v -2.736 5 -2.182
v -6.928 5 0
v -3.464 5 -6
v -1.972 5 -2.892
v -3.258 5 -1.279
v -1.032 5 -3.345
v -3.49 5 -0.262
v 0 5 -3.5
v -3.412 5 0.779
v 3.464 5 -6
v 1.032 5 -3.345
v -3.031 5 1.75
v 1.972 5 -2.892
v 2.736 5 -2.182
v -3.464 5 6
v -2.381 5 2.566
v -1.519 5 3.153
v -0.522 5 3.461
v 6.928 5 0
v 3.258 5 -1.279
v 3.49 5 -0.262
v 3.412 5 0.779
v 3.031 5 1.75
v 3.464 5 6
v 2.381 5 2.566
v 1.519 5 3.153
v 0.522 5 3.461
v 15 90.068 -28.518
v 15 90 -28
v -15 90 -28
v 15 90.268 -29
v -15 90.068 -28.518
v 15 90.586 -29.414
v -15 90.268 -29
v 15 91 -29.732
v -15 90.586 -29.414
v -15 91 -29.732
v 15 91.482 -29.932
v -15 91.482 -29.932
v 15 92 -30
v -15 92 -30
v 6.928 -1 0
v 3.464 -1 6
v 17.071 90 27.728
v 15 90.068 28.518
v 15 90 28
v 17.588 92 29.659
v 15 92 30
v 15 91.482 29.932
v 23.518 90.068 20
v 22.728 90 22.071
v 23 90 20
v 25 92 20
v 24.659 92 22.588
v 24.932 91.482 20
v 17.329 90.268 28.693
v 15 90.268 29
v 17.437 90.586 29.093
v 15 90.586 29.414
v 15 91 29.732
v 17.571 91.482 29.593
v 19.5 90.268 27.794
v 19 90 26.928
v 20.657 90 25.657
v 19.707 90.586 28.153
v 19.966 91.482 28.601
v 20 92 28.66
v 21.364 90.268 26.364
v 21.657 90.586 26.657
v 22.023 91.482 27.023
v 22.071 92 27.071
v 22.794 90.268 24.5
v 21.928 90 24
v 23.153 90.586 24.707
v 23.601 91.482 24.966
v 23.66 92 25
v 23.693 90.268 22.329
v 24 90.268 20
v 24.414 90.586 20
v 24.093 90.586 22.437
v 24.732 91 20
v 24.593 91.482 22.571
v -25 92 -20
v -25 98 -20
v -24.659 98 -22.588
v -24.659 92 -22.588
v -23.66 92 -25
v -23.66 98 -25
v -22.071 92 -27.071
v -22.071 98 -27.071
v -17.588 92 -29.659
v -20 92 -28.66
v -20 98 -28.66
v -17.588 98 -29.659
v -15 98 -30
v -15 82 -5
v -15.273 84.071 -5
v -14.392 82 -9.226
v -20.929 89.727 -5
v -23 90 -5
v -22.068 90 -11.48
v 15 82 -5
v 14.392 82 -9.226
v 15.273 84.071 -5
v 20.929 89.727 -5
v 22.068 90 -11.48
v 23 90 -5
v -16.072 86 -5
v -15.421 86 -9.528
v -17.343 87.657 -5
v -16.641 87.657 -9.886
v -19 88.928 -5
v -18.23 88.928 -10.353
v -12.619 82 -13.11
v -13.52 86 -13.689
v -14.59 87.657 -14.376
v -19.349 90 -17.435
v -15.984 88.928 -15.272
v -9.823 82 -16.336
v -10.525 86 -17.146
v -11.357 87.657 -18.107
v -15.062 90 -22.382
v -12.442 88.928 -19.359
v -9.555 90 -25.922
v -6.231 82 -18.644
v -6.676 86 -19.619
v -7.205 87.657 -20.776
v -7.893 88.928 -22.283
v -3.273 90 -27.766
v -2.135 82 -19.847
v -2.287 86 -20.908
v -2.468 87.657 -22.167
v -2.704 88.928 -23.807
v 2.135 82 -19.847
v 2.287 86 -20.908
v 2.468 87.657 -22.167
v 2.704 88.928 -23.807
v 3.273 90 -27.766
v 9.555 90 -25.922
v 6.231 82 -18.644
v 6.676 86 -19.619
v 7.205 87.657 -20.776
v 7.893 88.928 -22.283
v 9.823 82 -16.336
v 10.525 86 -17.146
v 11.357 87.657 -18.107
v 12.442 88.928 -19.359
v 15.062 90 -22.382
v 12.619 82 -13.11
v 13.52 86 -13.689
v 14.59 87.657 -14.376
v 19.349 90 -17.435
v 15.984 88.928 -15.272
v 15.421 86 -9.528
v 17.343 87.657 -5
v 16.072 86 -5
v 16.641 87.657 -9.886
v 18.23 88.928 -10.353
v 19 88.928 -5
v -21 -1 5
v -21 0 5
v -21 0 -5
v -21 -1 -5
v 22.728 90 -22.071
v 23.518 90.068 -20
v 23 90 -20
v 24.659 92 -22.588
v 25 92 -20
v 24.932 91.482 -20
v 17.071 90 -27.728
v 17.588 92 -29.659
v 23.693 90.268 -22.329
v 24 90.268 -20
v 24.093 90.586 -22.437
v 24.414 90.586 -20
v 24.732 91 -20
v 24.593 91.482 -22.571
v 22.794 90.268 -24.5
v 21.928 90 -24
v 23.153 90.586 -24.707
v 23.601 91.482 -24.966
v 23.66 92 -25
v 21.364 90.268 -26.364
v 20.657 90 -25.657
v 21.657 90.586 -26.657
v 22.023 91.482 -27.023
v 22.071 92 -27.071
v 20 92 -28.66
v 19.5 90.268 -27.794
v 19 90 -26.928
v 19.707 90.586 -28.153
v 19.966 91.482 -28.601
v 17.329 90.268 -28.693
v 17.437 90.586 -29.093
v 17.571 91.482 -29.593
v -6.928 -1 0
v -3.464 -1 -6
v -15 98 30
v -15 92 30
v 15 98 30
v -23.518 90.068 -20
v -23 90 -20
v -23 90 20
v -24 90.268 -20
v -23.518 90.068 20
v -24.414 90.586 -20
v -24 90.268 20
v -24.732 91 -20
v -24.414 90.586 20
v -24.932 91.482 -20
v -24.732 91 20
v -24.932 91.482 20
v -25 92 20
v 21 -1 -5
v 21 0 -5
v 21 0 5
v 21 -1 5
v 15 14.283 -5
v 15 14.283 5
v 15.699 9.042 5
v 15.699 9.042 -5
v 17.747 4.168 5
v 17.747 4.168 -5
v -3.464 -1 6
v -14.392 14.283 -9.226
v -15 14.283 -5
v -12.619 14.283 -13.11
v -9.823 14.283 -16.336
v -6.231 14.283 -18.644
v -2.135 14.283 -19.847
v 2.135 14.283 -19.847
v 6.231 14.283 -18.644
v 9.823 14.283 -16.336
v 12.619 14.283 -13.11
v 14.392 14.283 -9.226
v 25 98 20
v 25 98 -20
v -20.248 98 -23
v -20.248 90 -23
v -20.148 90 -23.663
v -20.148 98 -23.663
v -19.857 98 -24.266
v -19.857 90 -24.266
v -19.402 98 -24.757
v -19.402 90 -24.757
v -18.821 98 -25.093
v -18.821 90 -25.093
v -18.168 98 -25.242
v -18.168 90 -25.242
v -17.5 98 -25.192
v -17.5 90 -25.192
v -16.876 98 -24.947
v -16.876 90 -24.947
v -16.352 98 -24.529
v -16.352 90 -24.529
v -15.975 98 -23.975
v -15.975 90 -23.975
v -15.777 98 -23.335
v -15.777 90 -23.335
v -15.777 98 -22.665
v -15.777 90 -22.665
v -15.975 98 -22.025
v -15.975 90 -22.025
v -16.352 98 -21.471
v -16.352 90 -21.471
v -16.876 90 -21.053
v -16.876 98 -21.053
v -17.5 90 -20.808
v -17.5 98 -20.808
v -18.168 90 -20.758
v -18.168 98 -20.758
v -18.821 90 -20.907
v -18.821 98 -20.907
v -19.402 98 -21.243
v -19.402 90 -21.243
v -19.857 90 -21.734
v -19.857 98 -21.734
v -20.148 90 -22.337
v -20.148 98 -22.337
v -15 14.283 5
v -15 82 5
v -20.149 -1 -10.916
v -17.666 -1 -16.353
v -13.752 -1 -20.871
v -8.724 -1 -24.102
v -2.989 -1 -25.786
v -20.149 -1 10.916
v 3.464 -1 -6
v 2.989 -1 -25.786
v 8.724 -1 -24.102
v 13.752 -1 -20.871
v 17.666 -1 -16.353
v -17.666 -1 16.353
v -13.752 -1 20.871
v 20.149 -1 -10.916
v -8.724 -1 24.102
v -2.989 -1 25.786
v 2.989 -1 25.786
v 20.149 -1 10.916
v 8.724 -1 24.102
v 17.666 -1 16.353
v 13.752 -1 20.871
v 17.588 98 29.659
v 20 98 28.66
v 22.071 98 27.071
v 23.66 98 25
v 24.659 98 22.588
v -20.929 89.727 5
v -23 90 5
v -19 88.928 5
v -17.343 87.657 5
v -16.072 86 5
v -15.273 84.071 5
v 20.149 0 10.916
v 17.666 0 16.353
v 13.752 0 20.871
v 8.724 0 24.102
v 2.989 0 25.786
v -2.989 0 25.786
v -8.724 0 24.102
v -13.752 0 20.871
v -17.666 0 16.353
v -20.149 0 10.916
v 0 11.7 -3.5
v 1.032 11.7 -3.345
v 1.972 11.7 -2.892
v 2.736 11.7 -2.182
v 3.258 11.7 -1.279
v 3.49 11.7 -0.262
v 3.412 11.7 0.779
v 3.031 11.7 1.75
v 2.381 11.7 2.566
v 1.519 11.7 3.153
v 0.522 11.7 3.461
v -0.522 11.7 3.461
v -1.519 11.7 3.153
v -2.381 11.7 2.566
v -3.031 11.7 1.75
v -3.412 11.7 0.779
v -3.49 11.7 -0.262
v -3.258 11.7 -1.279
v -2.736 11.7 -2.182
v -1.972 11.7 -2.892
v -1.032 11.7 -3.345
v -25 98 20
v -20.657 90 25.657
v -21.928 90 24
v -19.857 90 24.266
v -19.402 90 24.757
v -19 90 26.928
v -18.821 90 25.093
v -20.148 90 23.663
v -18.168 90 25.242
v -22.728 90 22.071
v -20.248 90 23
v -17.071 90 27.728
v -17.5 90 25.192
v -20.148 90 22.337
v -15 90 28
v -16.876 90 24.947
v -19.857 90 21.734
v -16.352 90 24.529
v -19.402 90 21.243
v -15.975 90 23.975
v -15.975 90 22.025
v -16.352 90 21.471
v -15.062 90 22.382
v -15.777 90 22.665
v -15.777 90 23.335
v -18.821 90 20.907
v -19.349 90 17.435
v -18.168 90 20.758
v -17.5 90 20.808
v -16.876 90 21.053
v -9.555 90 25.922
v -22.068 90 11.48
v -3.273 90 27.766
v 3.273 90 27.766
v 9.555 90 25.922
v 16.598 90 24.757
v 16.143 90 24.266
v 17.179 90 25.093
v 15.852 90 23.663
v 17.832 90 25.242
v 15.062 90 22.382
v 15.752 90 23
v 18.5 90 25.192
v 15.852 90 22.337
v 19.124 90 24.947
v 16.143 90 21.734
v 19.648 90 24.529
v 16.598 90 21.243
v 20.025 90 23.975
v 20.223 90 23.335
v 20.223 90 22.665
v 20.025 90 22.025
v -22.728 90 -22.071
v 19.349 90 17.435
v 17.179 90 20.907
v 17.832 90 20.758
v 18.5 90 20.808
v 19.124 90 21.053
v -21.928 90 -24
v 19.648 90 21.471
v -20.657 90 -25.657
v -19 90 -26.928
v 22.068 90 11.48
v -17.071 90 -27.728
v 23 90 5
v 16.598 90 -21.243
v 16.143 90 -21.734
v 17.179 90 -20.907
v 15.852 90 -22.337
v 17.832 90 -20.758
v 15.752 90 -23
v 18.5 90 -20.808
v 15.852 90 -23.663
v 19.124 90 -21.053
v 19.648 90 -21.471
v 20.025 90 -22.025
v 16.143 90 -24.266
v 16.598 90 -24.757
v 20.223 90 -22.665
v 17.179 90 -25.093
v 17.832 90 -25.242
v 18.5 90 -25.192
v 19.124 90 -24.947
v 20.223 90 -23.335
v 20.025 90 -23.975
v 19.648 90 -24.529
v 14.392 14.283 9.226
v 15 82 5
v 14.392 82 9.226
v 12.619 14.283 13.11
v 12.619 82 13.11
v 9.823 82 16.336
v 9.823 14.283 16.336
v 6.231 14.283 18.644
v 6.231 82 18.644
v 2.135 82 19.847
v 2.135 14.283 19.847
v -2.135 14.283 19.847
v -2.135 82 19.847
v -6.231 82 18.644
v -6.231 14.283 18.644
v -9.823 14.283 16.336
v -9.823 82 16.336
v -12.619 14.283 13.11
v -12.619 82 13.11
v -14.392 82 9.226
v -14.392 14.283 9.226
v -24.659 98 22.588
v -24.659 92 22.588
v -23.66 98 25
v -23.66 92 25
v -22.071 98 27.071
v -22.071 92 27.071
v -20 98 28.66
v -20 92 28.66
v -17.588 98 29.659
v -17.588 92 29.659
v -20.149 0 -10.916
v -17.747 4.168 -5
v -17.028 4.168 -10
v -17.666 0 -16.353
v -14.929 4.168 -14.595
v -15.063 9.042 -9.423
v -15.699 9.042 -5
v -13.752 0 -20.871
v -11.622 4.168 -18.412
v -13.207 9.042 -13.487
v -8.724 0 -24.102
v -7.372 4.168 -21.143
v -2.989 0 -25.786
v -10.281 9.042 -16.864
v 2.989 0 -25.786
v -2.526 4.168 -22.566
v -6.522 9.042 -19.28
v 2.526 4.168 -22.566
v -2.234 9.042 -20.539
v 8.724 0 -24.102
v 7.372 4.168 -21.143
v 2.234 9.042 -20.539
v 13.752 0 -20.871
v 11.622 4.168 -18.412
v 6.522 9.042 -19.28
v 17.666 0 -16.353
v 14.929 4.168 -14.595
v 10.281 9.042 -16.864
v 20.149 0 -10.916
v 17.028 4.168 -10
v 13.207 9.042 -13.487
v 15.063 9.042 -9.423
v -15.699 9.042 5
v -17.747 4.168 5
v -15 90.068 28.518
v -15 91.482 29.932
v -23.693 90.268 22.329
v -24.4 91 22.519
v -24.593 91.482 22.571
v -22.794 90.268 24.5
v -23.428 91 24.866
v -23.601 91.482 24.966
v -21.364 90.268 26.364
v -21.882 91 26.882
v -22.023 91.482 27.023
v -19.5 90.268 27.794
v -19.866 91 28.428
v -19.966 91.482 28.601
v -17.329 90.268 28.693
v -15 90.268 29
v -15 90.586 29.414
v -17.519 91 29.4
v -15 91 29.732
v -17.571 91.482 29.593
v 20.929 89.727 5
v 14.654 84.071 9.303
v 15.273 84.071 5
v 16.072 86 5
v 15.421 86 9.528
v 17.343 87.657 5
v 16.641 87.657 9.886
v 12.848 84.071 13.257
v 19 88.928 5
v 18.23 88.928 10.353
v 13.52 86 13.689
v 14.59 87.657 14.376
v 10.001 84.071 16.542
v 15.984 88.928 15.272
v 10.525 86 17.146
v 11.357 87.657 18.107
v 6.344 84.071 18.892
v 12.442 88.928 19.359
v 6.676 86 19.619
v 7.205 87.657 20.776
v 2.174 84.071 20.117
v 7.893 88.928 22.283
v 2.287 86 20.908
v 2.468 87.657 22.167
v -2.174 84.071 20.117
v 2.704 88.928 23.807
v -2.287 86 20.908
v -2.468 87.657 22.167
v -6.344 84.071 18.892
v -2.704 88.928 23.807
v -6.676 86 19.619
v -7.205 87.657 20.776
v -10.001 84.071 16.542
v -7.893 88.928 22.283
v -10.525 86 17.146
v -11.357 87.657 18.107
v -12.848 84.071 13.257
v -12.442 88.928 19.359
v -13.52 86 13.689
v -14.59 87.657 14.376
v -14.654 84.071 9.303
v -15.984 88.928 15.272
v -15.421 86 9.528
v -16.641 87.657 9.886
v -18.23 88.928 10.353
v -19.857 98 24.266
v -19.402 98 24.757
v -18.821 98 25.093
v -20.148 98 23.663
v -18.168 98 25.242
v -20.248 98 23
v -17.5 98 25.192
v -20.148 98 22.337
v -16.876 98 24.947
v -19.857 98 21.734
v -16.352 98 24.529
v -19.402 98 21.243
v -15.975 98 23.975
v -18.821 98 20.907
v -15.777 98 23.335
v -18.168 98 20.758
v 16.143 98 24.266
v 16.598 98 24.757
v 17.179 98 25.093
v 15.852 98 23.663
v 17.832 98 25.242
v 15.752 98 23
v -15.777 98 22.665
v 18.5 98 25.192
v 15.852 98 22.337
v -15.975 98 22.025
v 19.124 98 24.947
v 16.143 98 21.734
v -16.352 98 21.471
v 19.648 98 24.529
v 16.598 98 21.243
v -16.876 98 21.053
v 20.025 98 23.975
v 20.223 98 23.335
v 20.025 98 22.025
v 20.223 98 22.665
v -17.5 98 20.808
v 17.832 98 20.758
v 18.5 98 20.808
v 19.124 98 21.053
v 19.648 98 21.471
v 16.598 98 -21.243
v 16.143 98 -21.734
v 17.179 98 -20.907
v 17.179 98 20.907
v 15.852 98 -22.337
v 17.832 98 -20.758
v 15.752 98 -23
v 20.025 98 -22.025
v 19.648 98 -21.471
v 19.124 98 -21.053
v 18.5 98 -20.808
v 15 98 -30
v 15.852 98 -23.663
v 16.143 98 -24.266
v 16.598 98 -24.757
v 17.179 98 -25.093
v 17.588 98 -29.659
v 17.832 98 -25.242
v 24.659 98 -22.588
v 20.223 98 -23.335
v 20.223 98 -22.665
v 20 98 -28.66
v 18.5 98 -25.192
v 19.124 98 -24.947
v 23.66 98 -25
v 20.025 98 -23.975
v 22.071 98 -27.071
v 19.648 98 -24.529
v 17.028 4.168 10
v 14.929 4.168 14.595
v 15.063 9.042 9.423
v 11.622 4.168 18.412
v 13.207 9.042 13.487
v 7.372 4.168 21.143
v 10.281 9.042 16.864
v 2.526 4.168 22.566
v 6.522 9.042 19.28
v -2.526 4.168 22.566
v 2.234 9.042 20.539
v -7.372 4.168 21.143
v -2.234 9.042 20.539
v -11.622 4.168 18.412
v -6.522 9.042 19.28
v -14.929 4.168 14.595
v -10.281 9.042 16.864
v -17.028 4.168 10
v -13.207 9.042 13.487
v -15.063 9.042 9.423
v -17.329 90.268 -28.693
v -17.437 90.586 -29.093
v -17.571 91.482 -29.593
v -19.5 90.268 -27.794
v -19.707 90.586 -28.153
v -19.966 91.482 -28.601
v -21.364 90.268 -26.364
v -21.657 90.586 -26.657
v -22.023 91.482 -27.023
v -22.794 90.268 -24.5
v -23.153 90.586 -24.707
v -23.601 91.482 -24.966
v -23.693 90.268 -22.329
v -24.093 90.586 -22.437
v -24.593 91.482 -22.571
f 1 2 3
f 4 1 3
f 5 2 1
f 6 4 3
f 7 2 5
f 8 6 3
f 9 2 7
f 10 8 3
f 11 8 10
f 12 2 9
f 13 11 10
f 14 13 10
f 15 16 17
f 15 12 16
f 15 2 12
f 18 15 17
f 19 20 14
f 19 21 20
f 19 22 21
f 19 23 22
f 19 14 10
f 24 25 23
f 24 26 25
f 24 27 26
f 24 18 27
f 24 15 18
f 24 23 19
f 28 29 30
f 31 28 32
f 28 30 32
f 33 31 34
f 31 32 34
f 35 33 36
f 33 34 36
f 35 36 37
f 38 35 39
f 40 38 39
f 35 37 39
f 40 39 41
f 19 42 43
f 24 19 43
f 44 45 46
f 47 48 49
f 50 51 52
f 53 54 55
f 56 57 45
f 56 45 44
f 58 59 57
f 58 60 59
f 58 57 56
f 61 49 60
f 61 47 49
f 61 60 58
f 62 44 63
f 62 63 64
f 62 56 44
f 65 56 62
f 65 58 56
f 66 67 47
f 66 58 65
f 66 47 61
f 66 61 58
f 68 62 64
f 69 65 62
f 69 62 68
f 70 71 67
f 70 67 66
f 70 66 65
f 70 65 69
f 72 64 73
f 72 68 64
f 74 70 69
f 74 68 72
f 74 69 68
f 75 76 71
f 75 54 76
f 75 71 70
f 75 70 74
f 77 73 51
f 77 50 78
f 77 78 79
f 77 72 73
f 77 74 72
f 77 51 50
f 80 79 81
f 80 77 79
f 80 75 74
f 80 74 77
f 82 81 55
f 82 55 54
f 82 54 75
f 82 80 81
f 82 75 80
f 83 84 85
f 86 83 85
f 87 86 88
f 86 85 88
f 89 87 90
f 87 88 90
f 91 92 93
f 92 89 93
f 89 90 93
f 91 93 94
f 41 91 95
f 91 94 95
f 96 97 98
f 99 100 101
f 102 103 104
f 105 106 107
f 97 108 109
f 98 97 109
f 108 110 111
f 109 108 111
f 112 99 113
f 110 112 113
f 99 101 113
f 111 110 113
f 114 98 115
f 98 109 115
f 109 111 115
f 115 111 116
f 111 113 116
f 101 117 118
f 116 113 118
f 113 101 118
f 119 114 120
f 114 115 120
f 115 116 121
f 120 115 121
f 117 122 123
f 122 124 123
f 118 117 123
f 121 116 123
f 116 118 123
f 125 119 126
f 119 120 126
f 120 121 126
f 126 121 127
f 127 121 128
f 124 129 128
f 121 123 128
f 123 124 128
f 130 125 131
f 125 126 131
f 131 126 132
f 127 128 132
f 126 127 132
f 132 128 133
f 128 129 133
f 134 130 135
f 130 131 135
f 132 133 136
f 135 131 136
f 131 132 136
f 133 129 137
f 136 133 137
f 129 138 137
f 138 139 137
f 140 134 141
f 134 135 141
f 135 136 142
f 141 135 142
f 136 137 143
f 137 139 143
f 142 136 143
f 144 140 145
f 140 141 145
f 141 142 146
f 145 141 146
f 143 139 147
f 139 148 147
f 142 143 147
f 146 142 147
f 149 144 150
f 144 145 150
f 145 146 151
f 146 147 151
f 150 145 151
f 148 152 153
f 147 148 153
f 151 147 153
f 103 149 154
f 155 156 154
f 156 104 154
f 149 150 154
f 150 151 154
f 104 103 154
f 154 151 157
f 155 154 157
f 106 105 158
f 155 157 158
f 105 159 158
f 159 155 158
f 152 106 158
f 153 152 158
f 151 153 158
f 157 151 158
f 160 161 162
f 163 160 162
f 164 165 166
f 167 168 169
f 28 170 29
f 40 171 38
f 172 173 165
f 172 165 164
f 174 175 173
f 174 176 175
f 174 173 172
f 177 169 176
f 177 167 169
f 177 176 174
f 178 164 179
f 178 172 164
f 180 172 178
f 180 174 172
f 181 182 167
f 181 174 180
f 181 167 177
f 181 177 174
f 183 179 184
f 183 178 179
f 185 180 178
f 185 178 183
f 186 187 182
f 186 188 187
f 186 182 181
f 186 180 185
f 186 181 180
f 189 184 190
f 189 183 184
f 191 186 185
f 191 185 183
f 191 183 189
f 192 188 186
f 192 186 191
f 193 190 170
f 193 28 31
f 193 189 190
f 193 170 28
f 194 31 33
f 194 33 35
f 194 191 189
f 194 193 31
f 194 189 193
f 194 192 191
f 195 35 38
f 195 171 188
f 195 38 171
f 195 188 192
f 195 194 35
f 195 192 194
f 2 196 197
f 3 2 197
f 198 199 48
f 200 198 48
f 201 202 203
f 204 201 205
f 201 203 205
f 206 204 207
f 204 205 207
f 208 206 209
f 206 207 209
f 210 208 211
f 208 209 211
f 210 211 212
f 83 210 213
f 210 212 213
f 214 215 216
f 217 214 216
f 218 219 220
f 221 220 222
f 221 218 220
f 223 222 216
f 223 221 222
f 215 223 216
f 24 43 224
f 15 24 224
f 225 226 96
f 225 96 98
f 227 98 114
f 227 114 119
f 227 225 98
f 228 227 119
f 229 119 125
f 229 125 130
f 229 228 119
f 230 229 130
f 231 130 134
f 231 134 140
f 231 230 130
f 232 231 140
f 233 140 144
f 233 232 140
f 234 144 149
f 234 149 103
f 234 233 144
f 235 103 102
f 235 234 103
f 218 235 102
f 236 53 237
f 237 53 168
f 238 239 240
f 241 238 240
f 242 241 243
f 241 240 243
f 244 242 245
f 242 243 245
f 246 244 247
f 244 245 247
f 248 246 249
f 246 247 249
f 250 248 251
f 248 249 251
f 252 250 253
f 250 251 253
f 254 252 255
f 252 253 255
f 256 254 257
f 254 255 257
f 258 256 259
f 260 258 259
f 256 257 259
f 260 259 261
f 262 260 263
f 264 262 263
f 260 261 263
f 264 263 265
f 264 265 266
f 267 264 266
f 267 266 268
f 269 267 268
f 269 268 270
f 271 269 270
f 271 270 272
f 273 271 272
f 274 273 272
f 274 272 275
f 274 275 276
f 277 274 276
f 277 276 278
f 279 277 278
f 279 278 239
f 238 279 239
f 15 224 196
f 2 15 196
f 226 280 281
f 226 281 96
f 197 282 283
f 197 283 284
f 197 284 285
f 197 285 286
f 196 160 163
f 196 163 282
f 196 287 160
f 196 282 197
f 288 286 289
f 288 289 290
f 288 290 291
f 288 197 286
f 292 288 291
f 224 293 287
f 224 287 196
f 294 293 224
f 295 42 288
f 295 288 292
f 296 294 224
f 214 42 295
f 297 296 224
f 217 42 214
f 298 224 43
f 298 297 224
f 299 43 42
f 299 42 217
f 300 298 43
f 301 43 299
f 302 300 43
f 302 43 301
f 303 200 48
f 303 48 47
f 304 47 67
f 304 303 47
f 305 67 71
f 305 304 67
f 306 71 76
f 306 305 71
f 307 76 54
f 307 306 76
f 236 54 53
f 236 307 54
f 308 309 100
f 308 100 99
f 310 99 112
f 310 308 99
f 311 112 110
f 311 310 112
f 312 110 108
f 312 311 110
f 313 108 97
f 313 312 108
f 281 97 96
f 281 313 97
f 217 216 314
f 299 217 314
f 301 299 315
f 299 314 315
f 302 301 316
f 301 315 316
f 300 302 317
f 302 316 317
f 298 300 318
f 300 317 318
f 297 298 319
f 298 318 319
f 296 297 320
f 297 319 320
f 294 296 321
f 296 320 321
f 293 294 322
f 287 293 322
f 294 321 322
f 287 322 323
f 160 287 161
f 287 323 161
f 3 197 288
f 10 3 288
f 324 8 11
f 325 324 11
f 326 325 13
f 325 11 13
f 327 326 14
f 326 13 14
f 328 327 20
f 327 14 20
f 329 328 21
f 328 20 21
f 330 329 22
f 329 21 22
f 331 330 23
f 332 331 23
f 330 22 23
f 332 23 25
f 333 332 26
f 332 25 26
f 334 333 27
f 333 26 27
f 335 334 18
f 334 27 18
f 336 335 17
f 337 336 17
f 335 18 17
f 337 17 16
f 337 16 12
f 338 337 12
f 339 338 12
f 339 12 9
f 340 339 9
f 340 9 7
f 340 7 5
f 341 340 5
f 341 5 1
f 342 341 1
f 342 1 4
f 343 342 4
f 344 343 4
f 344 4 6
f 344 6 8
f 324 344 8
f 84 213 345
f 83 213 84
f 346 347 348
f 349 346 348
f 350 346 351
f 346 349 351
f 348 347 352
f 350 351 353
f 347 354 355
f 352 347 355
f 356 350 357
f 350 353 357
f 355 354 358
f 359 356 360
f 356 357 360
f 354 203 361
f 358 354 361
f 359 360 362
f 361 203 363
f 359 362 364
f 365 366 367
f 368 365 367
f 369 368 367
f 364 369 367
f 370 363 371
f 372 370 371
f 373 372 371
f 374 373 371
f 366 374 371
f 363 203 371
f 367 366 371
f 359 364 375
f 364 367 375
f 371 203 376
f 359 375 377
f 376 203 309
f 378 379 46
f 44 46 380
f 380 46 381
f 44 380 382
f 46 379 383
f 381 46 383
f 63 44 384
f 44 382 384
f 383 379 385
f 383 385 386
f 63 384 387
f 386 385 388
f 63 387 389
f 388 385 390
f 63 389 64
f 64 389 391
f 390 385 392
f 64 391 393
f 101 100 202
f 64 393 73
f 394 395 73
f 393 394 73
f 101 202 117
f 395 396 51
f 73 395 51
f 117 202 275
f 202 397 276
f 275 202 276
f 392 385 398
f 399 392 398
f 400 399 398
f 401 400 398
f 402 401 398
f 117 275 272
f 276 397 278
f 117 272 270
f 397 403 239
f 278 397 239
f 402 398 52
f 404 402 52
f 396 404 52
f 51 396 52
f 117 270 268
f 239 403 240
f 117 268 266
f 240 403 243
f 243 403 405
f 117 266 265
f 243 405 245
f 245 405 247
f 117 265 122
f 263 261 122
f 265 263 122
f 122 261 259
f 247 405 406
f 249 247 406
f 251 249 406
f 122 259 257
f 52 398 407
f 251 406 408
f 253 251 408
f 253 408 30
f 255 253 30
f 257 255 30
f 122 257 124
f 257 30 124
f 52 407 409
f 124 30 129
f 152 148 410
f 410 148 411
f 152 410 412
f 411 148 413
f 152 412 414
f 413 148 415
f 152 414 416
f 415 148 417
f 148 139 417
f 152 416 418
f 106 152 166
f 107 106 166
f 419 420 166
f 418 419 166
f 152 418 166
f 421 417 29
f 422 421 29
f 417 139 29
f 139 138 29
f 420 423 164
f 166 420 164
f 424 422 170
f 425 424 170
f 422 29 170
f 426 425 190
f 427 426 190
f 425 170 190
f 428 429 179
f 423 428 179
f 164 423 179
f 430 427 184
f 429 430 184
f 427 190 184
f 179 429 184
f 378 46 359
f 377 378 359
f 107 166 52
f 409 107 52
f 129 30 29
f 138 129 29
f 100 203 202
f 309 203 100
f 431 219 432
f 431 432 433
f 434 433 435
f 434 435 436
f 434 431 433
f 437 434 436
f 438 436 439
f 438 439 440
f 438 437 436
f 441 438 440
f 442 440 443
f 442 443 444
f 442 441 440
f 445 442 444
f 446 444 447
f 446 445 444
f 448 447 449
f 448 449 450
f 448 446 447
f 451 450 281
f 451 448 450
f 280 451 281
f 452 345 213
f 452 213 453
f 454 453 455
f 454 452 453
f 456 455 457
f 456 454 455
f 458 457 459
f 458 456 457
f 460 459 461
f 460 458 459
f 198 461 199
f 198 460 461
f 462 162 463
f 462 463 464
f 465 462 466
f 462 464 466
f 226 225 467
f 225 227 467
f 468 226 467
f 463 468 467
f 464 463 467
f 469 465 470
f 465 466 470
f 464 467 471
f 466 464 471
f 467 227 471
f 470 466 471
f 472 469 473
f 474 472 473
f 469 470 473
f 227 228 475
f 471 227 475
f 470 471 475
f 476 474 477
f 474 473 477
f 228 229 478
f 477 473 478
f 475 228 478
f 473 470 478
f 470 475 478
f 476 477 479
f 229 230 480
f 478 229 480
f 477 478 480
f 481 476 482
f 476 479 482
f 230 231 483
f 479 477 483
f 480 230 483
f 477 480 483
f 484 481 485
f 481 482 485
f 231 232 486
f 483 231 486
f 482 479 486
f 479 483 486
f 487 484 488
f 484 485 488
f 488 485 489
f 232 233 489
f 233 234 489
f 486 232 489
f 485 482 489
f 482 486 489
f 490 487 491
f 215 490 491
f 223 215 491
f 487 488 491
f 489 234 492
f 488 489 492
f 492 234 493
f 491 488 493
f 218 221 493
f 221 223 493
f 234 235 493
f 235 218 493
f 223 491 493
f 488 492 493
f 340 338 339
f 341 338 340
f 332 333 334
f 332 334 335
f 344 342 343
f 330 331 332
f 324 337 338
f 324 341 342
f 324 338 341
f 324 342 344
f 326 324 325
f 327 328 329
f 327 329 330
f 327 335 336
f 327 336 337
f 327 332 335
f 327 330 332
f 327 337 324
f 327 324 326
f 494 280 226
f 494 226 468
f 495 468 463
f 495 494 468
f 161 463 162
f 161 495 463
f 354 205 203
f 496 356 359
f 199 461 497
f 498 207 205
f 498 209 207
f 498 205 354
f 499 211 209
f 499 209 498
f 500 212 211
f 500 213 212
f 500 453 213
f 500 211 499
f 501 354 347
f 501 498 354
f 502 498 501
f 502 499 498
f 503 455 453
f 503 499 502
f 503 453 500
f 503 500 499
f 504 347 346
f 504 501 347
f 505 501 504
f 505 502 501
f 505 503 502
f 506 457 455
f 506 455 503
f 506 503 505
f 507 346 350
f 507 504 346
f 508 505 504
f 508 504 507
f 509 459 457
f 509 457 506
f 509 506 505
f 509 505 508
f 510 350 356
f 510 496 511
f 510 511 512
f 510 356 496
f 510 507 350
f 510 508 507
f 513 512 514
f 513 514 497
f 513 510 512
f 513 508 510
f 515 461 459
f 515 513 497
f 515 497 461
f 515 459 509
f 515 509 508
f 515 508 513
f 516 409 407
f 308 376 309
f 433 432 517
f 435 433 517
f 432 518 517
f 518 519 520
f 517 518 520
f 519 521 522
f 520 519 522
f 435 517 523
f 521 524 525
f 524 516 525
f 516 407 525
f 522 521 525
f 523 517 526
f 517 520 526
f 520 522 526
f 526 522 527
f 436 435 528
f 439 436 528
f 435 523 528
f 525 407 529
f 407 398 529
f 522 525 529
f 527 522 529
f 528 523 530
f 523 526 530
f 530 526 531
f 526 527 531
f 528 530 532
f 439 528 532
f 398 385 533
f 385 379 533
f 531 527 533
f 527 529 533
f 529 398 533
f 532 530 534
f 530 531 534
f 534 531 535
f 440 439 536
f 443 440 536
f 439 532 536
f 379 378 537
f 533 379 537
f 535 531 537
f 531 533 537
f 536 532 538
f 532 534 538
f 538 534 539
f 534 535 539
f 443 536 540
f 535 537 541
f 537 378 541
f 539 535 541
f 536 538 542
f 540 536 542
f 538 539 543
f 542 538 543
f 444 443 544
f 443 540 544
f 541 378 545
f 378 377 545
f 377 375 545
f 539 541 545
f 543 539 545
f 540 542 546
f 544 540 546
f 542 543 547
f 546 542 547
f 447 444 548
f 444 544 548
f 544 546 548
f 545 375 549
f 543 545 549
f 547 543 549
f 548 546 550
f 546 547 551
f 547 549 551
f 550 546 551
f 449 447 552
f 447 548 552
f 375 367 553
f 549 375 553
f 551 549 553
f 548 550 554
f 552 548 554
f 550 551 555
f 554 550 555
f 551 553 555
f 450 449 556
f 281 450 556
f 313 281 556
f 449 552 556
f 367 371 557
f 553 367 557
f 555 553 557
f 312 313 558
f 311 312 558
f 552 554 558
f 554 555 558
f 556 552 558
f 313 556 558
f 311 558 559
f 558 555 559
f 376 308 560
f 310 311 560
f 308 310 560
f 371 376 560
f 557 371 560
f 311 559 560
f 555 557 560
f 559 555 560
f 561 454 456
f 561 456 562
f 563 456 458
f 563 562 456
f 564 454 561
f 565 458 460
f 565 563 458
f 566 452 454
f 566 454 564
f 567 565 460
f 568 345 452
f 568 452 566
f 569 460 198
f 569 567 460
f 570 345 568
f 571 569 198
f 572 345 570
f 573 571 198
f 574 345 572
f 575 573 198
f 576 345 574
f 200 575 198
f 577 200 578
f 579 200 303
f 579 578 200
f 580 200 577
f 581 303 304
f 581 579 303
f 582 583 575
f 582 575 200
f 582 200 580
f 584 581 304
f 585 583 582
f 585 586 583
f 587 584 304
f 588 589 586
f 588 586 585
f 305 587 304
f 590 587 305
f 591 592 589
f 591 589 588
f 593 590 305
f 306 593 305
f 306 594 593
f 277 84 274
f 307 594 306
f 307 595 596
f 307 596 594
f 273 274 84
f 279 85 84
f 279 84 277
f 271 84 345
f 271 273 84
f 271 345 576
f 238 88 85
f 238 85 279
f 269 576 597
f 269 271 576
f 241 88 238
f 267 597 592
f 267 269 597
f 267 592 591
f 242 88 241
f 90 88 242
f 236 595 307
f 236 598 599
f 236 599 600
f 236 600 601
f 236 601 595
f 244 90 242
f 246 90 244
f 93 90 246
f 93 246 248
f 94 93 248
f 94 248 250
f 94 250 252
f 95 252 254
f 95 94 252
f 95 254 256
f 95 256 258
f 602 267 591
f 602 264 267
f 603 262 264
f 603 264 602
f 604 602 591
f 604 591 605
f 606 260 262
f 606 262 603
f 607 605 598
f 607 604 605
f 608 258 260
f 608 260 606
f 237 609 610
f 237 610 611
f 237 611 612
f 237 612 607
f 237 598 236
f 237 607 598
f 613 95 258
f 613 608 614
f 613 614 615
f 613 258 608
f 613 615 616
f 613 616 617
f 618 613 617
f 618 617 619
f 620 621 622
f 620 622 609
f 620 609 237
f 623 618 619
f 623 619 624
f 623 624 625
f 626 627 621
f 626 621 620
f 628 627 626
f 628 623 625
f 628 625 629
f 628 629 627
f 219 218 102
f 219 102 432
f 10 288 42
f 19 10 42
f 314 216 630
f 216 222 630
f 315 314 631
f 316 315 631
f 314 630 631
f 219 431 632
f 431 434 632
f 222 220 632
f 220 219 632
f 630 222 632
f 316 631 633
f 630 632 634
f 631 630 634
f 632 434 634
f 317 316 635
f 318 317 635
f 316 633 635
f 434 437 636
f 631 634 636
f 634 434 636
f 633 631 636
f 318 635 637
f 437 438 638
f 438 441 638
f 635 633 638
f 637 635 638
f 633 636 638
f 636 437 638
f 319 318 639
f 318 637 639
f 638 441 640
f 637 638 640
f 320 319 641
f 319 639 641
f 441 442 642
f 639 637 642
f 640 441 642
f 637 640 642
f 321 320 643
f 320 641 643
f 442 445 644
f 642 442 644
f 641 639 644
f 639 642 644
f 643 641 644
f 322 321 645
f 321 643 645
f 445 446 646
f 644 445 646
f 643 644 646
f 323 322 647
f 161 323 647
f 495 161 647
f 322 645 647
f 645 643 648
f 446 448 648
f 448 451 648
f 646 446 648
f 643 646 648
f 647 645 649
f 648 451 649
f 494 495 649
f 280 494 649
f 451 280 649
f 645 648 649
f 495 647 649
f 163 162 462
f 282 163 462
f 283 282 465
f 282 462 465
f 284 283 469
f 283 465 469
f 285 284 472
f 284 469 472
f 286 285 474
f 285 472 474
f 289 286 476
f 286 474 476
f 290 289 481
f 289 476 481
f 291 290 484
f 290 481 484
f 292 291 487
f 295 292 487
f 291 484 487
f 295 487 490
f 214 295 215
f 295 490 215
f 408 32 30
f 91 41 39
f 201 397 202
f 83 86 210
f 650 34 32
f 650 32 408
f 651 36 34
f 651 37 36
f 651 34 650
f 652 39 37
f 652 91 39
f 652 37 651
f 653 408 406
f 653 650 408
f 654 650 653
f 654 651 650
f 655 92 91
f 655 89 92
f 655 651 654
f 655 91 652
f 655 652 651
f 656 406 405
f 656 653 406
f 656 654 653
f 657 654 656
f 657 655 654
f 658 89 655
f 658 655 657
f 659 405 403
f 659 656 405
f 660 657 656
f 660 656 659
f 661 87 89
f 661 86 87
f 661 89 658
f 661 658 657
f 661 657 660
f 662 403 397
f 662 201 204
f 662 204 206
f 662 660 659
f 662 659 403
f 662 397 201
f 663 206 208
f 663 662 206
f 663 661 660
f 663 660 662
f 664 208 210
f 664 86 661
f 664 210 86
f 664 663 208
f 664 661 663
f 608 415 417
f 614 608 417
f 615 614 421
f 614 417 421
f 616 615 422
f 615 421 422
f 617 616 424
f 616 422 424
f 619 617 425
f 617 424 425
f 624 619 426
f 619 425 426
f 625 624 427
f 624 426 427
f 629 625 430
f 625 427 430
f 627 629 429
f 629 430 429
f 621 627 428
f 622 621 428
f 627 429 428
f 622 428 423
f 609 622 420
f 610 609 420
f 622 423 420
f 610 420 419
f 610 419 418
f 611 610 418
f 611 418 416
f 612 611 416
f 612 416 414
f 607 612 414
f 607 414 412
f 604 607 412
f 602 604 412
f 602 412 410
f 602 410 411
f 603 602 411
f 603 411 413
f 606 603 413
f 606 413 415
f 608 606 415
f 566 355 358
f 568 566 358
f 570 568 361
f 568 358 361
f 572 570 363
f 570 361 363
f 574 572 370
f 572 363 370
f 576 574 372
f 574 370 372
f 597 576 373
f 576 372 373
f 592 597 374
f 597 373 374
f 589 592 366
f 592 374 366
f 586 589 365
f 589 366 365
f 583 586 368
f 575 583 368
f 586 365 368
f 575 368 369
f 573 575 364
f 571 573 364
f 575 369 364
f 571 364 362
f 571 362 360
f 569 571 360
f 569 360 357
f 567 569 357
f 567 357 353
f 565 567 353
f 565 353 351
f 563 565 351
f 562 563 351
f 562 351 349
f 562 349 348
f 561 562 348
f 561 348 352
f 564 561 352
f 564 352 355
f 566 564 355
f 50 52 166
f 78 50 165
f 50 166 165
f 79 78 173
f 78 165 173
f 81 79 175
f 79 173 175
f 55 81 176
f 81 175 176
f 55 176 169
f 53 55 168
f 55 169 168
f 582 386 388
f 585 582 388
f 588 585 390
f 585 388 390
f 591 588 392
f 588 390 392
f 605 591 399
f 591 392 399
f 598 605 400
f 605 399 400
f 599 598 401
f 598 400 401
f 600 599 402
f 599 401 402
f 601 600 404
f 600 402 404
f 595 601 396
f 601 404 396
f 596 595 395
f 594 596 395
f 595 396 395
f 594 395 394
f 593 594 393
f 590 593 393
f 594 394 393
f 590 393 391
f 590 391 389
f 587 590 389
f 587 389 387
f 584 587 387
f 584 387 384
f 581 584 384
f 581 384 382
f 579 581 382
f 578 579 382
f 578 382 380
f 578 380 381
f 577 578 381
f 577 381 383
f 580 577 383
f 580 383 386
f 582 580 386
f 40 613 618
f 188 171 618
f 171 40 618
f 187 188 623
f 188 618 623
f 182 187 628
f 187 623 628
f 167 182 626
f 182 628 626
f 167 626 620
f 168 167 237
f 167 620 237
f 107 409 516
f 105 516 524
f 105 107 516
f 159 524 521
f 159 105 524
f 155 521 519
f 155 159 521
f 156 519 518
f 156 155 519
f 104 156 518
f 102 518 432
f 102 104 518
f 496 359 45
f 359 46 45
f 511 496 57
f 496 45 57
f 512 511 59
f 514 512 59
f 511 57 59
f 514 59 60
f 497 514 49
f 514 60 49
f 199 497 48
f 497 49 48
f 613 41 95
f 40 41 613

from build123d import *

# Parameters (mm, degrees)
BOSS_EXTRUDE1_DEPTH       = 90
BOSS_EXTRUDE2_DEPTH       = 1
SKETCH3_W                 = 50
SKETCH3_H                 = 60
BOSS_EXTRUDE3_DEPTH       = 8
FILLET1_R                 = 20
FILLET1_R_2               = 8
F_8_CLEARANCE_HOLE1_D     = 4.4958
F_8_CLEARANCE_HOLE1_DEPTH = 15
F_8_CLEARANCE_HOLE1_TIP   = 1.350674586
SKETCH8_R                 = 3.5
CUT_EXTRUDE2_DEPTH        = 12.7
CUT_EXTRUDE1_DEPTH        = 6
FILLET2_R                 = 10
FILLET3_R                 = 2


# Some blends are built 0.0001 mm under size
with BuildPart() as part:
    # Sketch1 → Boss-Extrude1 (new body)
    with BuildSketch(Plane(origin=(0, 0, 0), x_dir=(1, 0, 0), z_dir=(0, 1, 0))):
        with BuildLine():
            Line((-15, -5), (-15, 5))
            ThreePointArc((-15, 5), (0, 20), (15, 5))
            Line((15, 5), (15, -5))
            ThreePointArc((15, -5), (0, -20), (-15, -5))
        make_face()
    extrude(amount=BOSS_EXTRUDE1_DEPTH)

    # Sketch2 → Boss-Extrude2 (add)
    with BuildSketch(Plane.XZ):
        with BuildLine():
            Line((-21, 5), (-21, -5))
            ThreePointArc((-21, -5), (0, -26), (21, -5))
            Line((21, -5), (21, 5))
            ThreePointArc((21, 5), (0, 26), (-21, 5))
        make_face()
    extrude(amount=BOSS_EXTRUDE2_DEPTH)

    # Sketch3 → Boss-Extrude3 (add)
    with BuildSketch(Plane(origin=(0, 90, 0), x_dir=(1, 0, 0), z_dir=(0, 1, 0))):
        Rectangle(SKETCH3_W, SKETCH3_H)
    extrude(amount=BOSS_EXTRUDE3_DEPTH)

    # Fillet1
    # the kernel refuses this fillet: 20, 8 mm, written as the material it adds along each edge
    with BuildSketch(Plane(origin=(0, 0, 5), x_dir=(1, 0, 0), z_dir=(0, 0, -1))) as fillet1_piece_1:
        with BuildLine():
            CenterArc((35, -14.282856857), FILLET1_R, 134.427004001, 45.572995999)
            Line((21, 0), (20.72, 0.285657137))
            ThreePointArc((20.72, 0.285657137), (18, 0.4), (15, 0.4))
            Line((15, 0.4), (14.6, 0))
            Line((14.6, 0), (14.6, -14.282856857))
            Line((14.6, -14.282856857), (15, -14.282856857))
        make_face()
    revolve(axis=Axis((0, 0, 5), (0, -1, 0)), revolution_arc=180)
    with BuildSketch(Plane(origin=(0, 90, 5), x_dir=(1, 0, 0), z_dir=(0, 0, -1))) as fillet1_piece_2:
        with BuildLine():
            CenterArc((15 + FILLET1_R_2, FILLET1_R_2), FILLET1_R_2, 180, 90)
            Line((15, FILLET1_R_2), (15 - FILLET1_R_2 * 0.02, FILLET1_R_2))
            Line((15 - FILLET1_R_2 * 0.02, FILLET1_R_2), (15 - FILLET1_R_2 * 0.02, -FILLET1_R_2 * 0.02))
            Line((15 - FILLET1_R_2 * 0.02, -FILLET1_R_2 * 0.02), (15 + FILLET1_R_2, -FILLET1_R_2 * 0.02))
            Line((15 + FILLET1_R_2, -FILLET1_R_2 * 0.02), (15 + FILLET1_R_2, 0))
        make_face()
    revolve(axis=Axis((0, 90, 5), (0, -1, 0)), revolution_arc=180)
    with BuildSketch(Plane(origin=(15, 90, -5), x_dir=(1, 0, 0), z_dir=(0, 0, 1)), Plane(origin=(-15, 90, 5), x_dir=(-1, 0, 0), z_dir=(0, 0, -1))) as fillet1_piece_3:
        with BuildLine():
            CenterArc((FILLET1_R_2, -FILLET1_R_2), FILLET1_R_2, 90, 90)
            Line((0, -FILLET1_R_2), (-FILLET1_R_2 * 0.02, -FILLET1_R_2))
            Line((-FILLET1_R_2 * 0.02, -FILLET1_R_2), (-FILLET1_R_2 * 0.02, FILLET1_R_2 * 0.02))
            Line((-FILLET1_R_2 * 0.02, FILLET1_R_2 * 0.02), (FILLET1_R_2, FILLET1_R_2 * 0.02))
            Line((FILLET1_R_2, FILLET1_R_2 * 0.02), (FILLET1_R_2, 0))
        make_face()
    extrude(amount=10)
    with BuildSketch(Plane(origin=(0, 90, -5), x_dir=(-1, 0, 0), z_dir=(0, 0, 1))) as fillet1_piece_4:
        with BuildLine():
            CenterArc((15 + FILLET1_R_2, FILLET1_R_2), FILLET1_R_2, 180, 90)
            Line((15, FILLET1_R_2), (15 - FILLET1_R_2 * 0.02, FILLET1_R_2))
            Line((15 - FILLET1_R_2 * 0.02, FILLET1_R_2), (15 - FILLET1_R_2 * 0.02, -FILLET1_R_2 * 0.02))
            Line((15 - FILLET1_R_2 * 0.02, -FILLET1_R_2 * 0.02), (15 + FILLET1_R_2, -FILLET1_R_2 * 0.02))
            Line((15 + FILLET1_R_2, -FILLET1_R_2 * 0.02), (15 + FILLET1_R_2, 0))
        make_face()
    revolve(axis=Axis((0, 90, -5), (0, -1, 0)), revolution_arc=180)
    with BuildSketch(Plane(origin=(15, 0, -5), x_dir=(0, 1, 0), z_dir=(0, 0, 1)), Plane(origin=(-15, 0, 5), x_dir=(0, 1, 0), z_dir=(0, 0, -1))) as fillet1_piece_5:
        with BuildLine():
            CenterArc((14.282856857, -20), FILLET1_R, 90, 45.572995999)
            Line((0, -6), (-0.285657137, -5.72))
            ThreePointArc((-0.285657137, -5.72), (-0.4, -3), (-0.4, 0))
            Line((-0.4, 0), (0, 0.4))
            Line((0, 0.4), (14.282856857, 0.4))
            Line((14.282856857, 0.4), (14.282856857, 0))
        make_face()
    extrude(amount=10)
    with BuildSketch(Plane(origin=(0, 0, -5), x_dir=(-1, 0, 0), z_dir=(0, 0, 1))) as fillet1_piece_6:
        with BuildLine():
            CenterArc((35, -14.282856857), FILLET1_R, 134.427004001, 45.572995999)
            Line((21, 0), (20.72, 0.285657137))
            ThreePointArc((20.72, 0.285657137), (18, 0.4), (15, 0.4))
            Line((15, 0.4), (14.6, 0))
            Line((14.6, 0), (14.6, -14.282856857))
            Line((14.6, -14.282856857), (15, -14.282856857))
        make_face()
    revolve(axis=Axis((0, 0, -5), (0, -1, 0)), revolution_arc=180)

    # #8 Clearance Hole1
    with Locations(Plane(origin=(0, 98, 0), x_dir=(1, 0, 0), z_dir=(0, 1, 0))):
        with Locations((-18, 23), (18, 23), (18, -23), (-18, -23)):
            Hole(F_8_CLEARANCE_HOLE1_D / 2, depth=F_8_CLEARANCE_HOLE1_DEPTH)
            with Locations((0, 0, -(F_8_CLEARANCE_HOLE1_DEPTH + F_8_CLEARANCE_HOLE1_TIP / 2))):  # 118° drill point
                Cone(0, F_8_CLEARANCE_HOLE1_D / 2, F_8_CLEARANCE_HOLE1_TIP, mode=Mode.SUBTRACT)

    # Sketch8 → Cut-Extrude2 (cut)
    with BuildSketch(Plane.XZ.offset(1)):
        with Locations(Location((0, 0, 0), (0, 0, 270))):
            Circle(SKETCH8_R)
    extrude(amount=-CUT_EXTRUDE2_DEPTH, mode=Mode.SUBTRACT)

    # Sketch7 → Cut-Extrude1 (cut)
    with BuildSketch(Plane.XZ.offset(1)):
        Polygon((-3.464101615, -6), (3.464101615, -6), (6.92820323, 0), (3.464101615, 6), (-3.464101615, 6), (-6.92820323, 0), align=None)
    extrude(amount=-CUT_EXTRUDE1_DEPTH, mode=Mode.SUBTRACT)

    # Fillet2
    fillet2_edges = [part.edges().sort_by_distance(p)[0] for p in [
        (-25, 94, -30),
        (-25, 94, 30),
        (25, 94, 30),
        (25, 94, -30),
    ]]
    fillet(fillet2_edges, radius=FILLET2_R)

    # Fillet3
    fillet3_edges = [part.edges().sort_by_distance(p)[0] for p in [
        (0, 90, 30),
        (-25, 90, 0),
        (0, 90, -30),
        (25, 90, 0),
        (22.071067812, 90, 27.071067812),
        (22.071067812, 90, -27.071067812),
        (-22.071067812, 90, -27.071067812),
        (-22.071067812, 90, 27.071067812),
    ]]
    fillet(fillet3_edges, radius=FILLET3_R - 0.0001)  # a hair under: the kernel refuses the full size


solid = part.part
